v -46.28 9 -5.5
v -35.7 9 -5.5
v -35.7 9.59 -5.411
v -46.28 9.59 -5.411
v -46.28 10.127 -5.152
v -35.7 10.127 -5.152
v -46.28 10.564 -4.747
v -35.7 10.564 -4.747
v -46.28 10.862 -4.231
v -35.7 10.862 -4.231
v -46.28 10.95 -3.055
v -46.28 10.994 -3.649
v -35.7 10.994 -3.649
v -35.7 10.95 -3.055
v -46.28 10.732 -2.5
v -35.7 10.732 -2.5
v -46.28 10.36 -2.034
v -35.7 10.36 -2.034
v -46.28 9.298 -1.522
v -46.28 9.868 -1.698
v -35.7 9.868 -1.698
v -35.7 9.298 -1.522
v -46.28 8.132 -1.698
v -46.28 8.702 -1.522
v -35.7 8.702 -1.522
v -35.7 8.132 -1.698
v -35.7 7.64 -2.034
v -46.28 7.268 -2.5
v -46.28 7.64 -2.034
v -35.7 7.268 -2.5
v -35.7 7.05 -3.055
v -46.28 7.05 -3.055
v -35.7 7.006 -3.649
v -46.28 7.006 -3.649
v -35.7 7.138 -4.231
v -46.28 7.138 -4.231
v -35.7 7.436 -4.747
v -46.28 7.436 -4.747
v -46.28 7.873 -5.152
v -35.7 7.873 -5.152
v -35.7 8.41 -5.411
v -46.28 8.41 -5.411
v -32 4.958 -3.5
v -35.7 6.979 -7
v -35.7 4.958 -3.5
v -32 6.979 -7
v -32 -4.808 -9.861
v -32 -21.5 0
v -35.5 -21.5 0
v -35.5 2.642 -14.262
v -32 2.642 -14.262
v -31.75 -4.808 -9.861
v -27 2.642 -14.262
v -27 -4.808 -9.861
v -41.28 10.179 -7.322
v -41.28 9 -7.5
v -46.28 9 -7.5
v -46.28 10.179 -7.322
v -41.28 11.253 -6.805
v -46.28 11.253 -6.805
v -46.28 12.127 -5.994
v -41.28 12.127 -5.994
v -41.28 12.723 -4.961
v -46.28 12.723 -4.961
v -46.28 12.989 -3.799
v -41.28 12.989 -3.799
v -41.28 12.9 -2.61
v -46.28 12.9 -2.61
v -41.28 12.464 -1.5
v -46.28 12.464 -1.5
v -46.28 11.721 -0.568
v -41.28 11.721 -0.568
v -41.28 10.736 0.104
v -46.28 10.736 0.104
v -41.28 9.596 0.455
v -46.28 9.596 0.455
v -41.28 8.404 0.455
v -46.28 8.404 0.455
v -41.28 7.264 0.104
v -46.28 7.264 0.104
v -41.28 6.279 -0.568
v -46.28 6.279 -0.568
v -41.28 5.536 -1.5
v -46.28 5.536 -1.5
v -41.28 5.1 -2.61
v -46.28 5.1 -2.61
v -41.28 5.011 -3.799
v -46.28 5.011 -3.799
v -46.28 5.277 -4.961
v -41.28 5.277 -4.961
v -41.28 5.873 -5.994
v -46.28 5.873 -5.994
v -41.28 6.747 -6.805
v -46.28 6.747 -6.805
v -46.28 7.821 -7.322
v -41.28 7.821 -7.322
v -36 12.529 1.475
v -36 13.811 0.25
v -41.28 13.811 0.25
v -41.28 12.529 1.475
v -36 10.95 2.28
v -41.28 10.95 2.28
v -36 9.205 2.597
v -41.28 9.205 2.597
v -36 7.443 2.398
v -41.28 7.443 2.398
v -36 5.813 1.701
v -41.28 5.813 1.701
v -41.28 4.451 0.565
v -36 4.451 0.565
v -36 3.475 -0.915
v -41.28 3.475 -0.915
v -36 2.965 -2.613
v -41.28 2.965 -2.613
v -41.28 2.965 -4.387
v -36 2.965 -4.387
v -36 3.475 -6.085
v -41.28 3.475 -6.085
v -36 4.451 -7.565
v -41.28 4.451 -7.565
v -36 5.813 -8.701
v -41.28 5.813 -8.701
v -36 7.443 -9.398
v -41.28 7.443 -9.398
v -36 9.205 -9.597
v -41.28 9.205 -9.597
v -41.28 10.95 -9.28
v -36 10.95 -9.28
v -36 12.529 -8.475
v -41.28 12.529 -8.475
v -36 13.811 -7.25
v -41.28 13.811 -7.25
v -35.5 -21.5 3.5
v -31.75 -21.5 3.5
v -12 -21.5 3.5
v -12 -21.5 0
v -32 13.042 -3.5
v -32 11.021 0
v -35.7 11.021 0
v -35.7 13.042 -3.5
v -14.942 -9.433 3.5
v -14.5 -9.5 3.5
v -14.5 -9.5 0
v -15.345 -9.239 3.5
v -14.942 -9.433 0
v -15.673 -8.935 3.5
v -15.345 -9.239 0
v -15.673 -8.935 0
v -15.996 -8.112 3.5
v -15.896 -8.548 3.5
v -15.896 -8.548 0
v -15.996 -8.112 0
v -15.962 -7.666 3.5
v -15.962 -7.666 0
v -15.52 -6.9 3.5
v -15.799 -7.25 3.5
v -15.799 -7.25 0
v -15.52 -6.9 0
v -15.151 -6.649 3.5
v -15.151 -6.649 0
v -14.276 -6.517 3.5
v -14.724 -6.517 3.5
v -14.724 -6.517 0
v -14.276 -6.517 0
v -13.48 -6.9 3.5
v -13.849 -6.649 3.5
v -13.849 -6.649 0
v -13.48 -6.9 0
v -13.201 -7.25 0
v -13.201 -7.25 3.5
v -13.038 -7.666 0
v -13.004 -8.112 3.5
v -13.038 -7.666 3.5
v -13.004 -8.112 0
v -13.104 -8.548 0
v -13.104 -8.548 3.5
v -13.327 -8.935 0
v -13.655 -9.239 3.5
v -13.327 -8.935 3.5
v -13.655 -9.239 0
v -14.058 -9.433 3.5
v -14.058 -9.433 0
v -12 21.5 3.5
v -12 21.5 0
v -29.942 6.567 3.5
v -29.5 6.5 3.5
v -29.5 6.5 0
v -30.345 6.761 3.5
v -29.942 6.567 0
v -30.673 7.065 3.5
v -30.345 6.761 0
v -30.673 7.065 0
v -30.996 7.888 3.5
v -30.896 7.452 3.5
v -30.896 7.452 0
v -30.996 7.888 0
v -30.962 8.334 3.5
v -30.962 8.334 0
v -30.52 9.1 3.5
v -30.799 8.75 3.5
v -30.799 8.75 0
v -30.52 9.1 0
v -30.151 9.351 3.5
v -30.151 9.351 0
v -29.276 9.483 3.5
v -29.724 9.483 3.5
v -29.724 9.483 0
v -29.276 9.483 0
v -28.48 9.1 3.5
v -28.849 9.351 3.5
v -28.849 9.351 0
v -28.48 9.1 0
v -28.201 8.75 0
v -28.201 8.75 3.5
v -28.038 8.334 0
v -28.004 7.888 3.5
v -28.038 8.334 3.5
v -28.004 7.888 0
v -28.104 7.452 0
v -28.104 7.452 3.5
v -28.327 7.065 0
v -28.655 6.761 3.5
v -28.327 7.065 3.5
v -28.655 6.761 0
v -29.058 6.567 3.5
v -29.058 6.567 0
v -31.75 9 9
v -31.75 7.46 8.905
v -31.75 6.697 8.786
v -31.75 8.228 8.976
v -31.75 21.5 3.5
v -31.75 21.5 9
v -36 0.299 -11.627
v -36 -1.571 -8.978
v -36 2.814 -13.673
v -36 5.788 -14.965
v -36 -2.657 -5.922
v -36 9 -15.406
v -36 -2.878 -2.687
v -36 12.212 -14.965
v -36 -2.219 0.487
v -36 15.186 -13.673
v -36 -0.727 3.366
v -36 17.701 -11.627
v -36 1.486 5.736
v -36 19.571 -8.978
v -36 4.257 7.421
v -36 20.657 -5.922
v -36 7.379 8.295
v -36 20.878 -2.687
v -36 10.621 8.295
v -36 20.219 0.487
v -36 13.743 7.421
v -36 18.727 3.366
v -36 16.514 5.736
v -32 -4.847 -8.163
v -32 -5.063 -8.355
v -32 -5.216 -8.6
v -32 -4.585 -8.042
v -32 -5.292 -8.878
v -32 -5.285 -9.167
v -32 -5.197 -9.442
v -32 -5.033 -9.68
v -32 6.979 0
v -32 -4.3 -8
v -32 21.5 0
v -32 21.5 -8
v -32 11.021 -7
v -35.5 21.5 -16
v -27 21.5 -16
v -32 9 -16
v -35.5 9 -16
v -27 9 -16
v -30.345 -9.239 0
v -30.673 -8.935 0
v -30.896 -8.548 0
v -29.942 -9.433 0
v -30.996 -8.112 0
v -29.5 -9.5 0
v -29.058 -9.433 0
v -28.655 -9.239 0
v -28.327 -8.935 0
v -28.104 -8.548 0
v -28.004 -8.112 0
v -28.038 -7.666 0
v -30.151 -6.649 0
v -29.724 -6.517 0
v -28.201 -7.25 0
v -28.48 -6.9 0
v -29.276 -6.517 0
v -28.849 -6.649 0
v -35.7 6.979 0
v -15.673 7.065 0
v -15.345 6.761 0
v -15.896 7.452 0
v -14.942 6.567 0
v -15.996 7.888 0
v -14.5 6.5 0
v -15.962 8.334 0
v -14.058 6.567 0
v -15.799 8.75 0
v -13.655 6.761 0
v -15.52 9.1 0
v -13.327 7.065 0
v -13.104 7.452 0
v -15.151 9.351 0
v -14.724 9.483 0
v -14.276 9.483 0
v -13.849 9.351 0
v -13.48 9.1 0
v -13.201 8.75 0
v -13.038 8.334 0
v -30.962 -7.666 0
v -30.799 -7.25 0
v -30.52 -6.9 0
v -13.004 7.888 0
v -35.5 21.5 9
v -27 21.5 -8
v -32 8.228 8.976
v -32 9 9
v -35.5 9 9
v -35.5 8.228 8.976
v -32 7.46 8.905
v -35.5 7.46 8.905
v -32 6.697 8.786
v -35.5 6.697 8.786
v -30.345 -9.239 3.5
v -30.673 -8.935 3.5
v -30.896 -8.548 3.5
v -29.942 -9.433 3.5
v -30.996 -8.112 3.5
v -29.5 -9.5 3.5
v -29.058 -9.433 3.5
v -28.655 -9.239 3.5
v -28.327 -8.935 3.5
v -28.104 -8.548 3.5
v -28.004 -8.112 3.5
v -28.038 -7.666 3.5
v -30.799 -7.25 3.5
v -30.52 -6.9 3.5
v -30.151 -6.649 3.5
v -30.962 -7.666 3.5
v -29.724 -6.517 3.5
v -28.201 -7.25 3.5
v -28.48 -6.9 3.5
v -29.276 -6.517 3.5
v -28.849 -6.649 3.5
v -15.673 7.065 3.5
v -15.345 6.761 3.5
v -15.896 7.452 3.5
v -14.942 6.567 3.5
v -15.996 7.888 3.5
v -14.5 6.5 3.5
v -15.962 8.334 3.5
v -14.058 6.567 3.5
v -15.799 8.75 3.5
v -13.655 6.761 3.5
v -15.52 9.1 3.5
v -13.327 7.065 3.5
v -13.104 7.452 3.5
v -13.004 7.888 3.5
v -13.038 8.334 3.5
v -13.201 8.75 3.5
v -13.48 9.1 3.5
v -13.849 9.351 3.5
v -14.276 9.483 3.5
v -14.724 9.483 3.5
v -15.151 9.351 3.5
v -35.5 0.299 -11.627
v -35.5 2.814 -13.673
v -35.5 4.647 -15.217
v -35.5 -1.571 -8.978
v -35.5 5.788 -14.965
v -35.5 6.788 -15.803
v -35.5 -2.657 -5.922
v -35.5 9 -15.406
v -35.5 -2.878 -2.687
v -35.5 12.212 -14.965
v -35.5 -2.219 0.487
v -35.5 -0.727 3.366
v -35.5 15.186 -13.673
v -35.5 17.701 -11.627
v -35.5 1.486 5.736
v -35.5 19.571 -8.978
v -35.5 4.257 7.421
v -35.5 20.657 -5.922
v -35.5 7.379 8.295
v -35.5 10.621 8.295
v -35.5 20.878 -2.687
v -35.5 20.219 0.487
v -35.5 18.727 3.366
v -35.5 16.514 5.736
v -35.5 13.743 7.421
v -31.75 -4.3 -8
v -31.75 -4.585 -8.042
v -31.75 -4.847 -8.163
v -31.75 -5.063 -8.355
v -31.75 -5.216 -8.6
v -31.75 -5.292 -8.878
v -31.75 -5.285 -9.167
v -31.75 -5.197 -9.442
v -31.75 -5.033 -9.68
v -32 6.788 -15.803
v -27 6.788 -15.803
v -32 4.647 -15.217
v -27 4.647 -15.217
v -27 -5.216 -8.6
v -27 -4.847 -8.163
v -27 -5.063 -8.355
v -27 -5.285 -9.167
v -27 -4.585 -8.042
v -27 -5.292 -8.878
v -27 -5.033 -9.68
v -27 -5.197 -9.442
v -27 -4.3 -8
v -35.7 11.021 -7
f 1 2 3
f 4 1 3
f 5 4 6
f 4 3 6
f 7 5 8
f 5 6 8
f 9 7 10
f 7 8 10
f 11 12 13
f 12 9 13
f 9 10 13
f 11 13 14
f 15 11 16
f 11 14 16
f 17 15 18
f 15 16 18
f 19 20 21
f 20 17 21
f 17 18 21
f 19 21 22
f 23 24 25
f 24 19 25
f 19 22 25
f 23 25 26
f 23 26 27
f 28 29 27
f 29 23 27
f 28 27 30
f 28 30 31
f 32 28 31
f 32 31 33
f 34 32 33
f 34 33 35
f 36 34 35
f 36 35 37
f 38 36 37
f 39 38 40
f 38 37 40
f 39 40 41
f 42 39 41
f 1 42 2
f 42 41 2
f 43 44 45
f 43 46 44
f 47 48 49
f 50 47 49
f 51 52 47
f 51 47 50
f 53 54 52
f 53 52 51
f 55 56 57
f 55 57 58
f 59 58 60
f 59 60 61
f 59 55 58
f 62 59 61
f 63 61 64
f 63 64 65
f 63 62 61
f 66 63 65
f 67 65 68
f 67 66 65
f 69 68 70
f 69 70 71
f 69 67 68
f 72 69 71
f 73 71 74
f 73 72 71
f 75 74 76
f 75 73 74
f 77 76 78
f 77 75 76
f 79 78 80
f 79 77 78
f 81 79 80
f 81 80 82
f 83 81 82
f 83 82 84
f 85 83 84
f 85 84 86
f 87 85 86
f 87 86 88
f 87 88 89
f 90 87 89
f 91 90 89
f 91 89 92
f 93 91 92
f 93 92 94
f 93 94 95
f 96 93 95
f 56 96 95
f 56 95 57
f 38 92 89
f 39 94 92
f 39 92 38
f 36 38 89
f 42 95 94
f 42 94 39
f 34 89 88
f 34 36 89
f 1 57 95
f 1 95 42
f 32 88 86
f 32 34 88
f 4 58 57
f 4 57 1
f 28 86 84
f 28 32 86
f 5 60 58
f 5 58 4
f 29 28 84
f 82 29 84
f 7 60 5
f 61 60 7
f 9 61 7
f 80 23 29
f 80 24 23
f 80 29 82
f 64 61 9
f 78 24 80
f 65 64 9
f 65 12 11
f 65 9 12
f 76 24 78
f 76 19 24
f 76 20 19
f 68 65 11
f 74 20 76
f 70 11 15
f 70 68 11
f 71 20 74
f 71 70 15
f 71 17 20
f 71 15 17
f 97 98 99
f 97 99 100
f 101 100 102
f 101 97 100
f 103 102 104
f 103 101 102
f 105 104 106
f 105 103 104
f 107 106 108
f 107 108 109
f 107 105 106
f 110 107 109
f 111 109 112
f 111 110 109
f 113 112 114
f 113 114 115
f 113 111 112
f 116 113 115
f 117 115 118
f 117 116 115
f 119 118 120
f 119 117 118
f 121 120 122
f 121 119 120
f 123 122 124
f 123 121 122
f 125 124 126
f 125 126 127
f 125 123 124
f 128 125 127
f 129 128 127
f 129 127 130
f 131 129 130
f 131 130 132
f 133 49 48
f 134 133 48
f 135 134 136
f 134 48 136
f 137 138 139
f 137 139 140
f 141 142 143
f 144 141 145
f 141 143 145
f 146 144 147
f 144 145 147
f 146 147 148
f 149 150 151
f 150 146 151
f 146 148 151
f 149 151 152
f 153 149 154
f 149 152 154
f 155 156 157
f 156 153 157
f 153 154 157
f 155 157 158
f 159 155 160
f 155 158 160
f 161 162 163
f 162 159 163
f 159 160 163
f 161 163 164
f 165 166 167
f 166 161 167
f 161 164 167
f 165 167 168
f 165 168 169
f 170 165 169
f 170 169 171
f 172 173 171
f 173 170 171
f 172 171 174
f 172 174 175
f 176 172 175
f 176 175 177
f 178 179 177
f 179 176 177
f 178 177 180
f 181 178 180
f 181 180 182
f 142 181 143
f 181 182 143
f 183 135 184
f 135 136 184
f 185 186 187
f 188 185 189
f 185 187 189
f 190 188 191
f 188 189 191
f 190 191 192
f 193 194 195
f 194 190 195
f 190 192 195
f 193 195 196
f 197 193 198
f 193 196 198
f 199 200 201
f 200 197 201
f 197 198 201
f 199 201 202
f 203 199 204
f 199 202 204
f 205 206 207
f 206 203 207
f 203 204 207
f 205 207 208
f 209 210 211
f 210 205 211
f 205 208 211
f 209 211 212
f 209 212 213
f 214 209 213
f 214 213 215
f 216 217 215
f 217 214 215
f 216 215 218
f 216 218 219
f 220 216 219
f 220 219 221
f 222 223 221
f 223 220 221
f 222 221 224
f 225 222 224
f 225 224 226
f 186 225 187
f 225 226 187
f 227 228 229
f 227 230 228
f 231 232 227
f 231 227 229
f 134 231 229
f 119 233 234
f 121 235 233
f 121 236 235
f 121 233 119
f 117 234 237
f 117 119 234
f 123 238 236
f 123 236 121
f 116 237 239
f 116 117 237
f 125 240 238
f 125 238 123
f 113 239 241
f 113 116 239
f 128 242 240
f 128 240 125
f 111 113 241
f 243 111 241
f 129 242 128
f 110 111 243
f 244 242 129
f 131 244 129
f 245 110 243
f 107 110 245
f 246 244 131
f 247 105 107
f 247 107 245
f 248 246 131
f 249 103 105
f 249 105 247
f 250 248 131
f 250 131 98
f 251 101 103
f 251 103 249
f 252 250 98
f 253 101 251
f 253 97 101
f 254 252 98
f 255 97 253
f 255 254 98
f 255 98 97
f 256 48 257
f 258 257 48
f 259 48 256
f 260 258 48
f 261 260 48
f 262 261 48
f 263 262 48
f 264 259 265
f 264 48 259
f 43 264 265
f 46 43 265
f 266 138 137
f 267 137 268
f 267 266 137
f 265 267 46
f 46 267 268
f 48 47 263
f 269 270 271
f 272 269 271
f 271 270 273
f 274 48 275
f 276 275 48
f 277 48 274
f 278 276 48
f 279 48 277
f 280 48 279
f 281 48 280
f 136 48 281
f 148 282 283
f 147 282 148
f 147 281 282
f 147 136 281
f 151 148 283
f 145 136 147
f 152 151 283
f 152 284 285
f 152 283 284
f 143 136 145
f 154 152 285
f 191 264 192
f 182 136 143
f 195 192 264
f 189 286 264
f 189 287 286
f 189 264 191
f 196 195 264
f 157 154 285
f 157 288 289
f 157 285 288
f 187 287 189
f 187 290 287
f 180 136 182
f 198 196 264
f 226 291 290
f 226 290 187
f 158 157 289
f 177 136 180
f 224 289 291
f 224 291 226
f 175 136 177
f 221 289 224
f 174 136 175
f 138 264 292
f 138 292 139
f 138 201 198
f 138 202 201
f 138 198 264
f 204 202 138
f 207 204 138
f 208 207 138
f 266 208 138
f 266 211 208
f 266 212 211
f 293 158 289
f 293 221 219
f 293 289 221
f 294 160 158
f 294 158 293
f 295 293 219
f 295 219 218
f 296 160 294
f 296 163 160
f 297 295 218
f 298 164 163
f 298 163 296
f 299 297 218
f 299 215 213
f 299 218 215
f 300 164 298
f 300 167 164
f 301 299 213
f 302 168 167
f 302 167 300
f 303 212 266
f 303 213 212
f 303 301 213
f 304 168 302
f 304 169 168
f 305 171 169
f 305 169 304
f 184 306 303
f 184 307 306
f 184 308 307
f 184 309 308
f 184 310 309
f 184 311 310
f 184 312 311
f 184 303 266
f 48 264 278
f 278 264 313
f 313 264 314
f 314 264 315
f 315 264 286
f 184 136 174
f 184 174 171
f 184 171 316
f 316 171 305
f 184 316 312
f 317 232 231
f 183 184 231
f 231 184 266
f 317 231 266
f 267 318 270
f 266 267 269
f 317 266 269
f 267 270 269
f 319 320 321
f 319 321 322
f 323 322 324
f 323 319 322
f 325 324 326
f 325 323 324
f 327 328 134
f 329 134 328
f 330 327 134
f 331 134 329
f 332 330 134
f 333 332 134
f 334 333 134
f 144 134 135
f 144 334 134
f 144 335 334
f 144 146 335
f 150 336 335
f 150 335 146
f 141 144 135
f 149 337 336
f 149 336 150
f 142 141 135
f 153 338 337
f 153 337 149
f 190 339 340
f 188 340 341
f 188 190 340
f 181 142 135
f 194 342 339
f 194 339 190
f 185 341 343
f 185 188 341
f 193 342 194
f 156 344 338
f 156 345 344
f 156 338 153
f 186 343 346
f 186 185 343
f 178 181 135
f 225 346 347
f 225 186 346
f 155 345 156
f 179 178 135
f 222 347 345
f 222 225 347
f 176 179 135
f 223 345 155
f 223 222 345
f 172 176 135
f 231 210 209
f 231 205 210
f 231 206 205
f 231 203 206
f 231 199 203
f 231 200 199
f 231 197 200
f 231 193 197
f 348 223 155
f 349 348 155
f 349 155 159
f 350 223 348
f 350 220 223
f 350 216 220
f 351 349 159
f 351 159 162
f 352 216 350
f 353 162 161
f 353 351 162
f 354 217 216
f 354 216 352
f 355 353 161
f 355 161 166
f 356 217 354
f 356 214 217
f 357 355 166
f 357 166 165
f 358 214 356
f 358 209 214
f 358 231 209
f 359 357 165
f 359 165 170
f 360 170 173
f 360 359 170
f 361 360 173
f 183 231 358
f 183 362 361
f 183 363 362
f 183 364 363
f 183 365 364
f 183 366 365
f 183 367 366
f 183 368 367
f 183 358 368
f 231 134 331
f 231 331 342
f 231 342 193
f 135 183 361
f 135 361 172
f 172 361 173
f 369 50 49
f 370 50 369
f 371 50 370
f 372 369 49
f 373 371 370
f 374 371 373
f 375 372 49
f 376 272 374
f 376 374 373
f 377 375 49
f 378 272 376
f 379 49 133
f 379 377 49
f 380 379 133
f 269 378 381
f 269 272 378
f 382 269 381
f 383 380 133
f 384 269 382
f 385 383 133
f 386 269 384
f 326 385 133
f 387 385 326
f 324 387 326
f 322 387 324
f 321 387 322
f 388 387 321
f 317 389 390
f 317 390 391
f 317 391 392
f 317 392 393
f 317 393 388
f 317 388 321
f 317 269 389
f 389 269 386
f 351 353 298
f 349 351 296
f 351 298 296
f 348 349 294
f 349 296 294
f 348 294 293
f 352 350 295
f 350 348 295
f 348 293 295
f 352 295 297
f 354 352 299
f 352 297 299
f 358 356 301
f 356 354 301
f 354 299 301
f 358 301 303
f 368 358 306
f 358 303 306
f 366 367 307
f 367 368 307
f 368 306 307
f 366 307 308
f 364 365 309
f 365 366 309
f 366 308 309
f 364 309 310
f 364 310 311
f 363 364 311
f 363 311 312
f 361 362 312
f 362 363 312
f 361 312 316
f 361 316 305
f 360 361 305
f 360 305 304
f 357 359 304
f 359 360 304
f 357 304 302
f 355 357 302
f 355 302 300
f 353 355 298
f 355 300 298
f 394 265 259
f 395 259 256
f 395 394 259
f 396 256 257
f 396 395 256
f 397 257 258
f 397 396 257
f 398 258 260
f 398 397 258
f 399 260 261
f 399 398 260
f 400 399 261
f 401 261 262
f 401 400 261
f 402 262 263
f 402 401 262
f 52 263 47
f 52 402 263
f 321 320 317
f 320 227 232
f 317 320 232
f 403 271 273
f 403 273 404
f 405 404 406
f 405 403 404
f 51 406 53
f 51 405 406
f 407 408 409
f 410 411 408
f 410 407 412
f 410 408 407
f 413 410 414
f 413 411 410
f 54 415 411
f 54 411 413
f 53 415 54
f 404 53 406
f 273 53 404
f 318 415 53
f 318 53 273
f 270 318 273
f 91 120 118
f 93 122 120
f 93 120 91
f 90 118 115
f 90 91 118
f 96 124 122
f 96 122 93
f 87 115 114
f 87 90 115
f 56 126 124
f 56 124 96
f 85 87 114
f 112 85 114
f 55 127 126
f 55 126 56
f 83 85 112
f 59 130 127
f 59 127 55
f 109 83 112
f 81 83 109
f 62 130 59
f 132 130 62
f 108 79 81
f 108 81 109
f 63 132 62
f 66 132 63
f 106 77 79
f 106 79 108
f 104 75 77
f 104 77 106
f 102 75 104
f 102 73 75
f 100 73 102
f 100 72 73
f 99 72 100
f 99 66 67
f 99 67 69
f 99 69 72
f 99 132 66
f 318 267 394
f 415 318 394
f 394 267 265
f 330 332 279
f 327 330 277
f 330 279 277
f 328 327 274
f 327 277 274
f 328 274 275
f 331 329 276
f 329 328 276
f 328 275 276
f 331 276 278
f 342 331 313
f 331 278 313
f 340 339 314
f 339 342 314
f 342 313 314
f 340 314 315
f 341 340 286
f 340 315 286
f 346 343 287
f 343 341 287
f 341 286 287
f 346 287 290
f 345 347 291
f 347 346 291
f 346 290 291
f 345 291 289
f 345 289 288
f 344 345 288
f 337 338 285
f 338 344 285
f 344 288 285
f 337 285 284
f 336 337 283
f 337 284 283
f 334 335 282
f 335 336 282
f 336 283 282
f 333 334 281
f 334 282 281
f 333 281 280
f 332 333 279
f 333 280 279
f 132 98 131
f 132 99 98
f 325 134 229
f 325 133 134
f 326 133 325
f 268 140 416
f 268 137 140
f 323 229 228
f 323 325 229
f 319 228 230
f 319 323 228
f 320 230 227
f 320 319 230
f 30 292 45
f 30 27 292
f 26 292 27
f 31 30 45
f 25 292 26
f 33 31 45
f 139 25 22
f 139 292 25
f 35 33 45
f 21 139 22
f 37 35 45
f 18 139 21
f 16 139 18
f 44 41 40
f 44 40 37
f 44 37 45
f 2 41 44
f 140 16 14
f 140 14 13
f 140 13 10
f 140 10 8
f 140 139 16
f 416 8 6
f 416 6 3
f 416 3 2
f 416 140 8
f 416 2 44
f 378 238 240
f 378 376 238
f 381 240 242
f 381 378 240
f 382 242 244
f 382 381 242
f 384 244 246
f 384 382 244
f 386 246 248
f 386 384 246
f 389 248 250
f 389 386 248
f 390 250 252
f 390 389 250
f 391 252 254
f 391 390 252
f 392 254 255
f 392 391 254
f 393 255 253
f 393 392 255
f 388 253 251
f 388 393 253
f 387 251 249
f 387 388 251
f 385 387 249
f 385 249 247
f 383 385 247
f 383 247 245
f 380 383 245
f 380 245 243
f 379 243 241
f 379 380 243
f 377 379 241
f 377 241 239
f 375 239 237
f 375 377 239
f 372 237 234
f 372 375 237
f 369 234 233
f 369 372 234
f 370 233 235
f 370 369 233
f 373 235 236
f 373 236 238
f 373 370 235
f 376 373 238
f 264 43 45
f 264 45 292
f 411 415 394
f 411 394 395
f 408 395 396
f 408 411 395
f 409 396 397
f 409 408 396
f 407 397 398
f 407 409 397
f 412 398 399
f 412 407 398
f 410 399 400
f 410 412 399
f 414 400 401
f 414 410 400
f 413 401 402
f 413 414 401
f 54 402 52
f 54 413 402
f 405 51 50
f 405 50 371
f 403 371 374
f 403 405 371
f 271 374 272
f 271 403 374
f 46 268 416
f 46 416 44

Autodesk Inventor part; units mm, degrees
ref_plane "YZ Plane" through (0, 0, 0) normal (1, 0, 0) x (0, 1, 0)
ref_plane "XZ Plane" through (0, 0, 0) normal (0, 1, 0) x (-1, 0, 0)
sketch "Sketch1" plane through (0, 0, 0) normal (0, 0, 1) x (1, 0, 0)
  line L0 (-10, -21.5) -> (10, -21.5)
  line L1 (10, -21.5) -> (10, 21.5)
  line L2 (10, 21.5) -> (-10, 21.5)
  line L3 (-10, 21.5) -> (-10, -21.5)
  line L4 (-10, -21.5) -> (10, 21.5) construction
  line L5 (10, -21.5) -> (-10, 21.5) construction
  point P0 (0, 0)
  dimension "d0" = 20
  dimension "d1" = 43
extrude "Extrusion1" add sketch "Sketch1" along normal blind 3.5
sketch "Sketch2" plane through (0, 0, 3.5) normal (0, 0, 1) x (1, 0, 0)
  line L0 (-7.5, -8) -> (7.5, -8)
  line L1 (7.5, -8) -> (7.5, 8)
  line L2 (7.5, 8) -> (-7.5, 8)
  line L3 (-7.5, 8) -> (-7.5, -8)
  line L4 (-7.5, -8) -> (7.5, 8) construction
  line L5 (7.5, -8) -> (-7.5, 8) construction
  point P0 (0, 0)
  dimension "d4" = 15
  dimension "d5" = 16
hole "Hole1" at (-7.5, 8, 3.5) at (7.5, 8, 3.5) at (7.5, -8, 3.5) at (-7.5, -8, 3.5) direction (0, 0, -1) diameter 3 end through all
sketch "Sketch3" plane through (10, -21.5, 0) normal (1, 0, 0) x (0, 0, -1)
  circle A0 centre (3.5, 30.5) radius 11.9062
  line L0 (0, 0) -> (0, 43) projected
  circle A1 centre (3.5, 30.5) radius 12.5
  line L1 (0, 43) -> (3.5, 43)
  line L2 (14.2623, 24.142) -> (0, 0)
  line L3 (-3.5, 43) -> (-3.5, 0) projected
  line L4 (-3.5, 43) -> (-7.1577, 37.0317)
  line L5 (-3.5, 0) -> (-8.786, 28.1968)
  line L6 (0, 0) -> (-3.5, 0) projected
  line L7 (0, 43) -> (-3.5, 43) projected
  line L8 (16, 30.5) -> (16, 43)
  line L9 (16, 43) -> (-9, 43)
  line L10 (-9, 43) -> (-9, 30.5)
  line L11 (9, 43) -> (12.7158, 38.945)
  point P0 (0, 21.5)
  point P1 (0, 21.5)
  point P2 (3.5, 43)
  dimension "d14" = 25
  dimension "d13" = 23.8125
  dimension "d15" = 3.5
  dimension "d26" = 9
extrude "Extrusion2" add sketch "Sketch3" along normal blind 3.5
sketch "Sketch4" plane through (13.5, -21.5, 0) normal (1, 0, 0) x (0, 0, -1)
  circle A0 centre (3.5, 30.5) radius 11.9062 projected
  point P0 (0, 21.5)
extrude "Extrusion3" add sketch "Sketch4" along normal blind 0.5
sketch "Sketch5" plane through (10, -21.5, 0) normal (-1, 0, 0) x (0, 0, 1)
  line L0 (3.5, 0) -> (3.5, 43) projected
  line L1 (8.786, 28.1968) -> (3.5, 0) projected
  arc A0 (-16, 30.5) -> (-14.2623, 24.142) centre (-3.5, 30.5) ccw projected
  arc A1 (8.786, 28.1968) -> (9, 30.5) centre (-3.5, 30.5) ccw projected
  line L2 (0, 0) -> (0, 43) projected
  line L3 (0, 0) -> (-14.2623, 24.142) projected
  line L4 (-16, 43) -> (0, 43) projected
  line L5 (-16, 30.5) -> (-16, 43) projected
  line L6 (9, 43) -> (9, 30.5) projected
  line L7 (3.5, 43) -> (9, 43) projected
  point P0 (0, 21.5)
extrude "Extrusion4" add sketch "Sketch5" along normal blind 0.25
sketch "Sketch6" plane through (10, -21.5, 0) normal (-1, 0, 0) x (0, 0, 1)
  line L0 (-14.2623, 24.142) -> (0, 0) projected
  line L1 (0, 43) -> (0, 0) projected
  line L2 (0, 43) -> (-16, 43) projected
  line L3 (-16, 43) -> (-16, 30.5) projected
  arc A0 (-16, 30.5) -> (-14.2623, 24.142) centre (-3.5, 30.5) ccw projected
  line L4 (-8, 13.5418) -> (-8, 43)
  dimension "d67" = 8
extrude "Extrusion5" add sketch "Sketch6" along normal blind 5 contours A0 L3 L2 L4 L0
sketch "Sketch7" plane through (14, 9, -3.5) normal (1, 0, 0) x (0, 0, -1)
  circle A0 centre (0, 0) radius 11.9062 projected
  circle A1 centre (0, 0) radius 6.1
  circle A2 centre (-2, 3.4641) radius 1.5
  circle A3 centre (4, 0) radius 1.5
  circle A4 centre (-2, -3.4641) radius 1.5
  line L0 (-2, 3.4641) -> (0, 0) construction
  line L1 (0, 0) -> (4, 0) construction
  line L2 (-2, -3.4641) -> (0, 0) construction
  circle A5 centre (0, 0) radius 2
  point P0 (-3.5, -9)
  dimension "d27" = 12.2
  dimension "d28" = 3
  dimension "d29" = 120
  dimension "d30" = 120
  dimension "d31" = 4
  dimension "d32" = 4
sketch "Sketch10" plane through (14, 9, -3.5) normal (1, 0, 0) x (0, 0, -1)
  circle A0 centre (0, 0) radius 11.9062 projected
  circle A1 centre (0, 0) radius 6.1
  point P0 (-3.5, -9)
  dimension "d44" = 12.2
extrude "Extrusion7" add sketch "Sketch10" along normal blind 5.28 contours A1
sketch "Sketch11" plane through (19.28, 9, -3.5) normal (1, 0, 0) x (0, 0, -1)
  circle A0 centre (0, 0) radius 6.1 projected
  circle A1 centre (0, 0) radius 4
  point P0 (-3.5, -9)
  dimension "d47" = 8
extrude "Extrusion8" add sketch "Sketch11" along normal blind 5 contours A1
sketch "Sketch12" plane through (24.28, 9, -3.5) normal (1, 0, 0) x (0, 0, -1)
  circle A0 centre (0, 0) radius 4 projected
  point P0 (-3.5, -9)
hole "Hole3" at (24.28, 9, -3.5) direction (-1, 0, 0) diameter 4 end through all
sketch "Sketch13" plane through (10, -21.5, 0) normal (-1, 0, 0) x (0, 0, 1)
  circle A0 centre (-3.5, 30.5) radius 2 projected
  line L0 (-8, 43) -> (-8, 13.5418) projected
  line L1 (-8, 13.5418) -> (0, 0) projected
  line L2 (0, 43) -> (0, 0) projected
  line L3 (0, 43) -> (-8, 43) projected
  line L4 (-7, 32.5207) -> (-3.5, 34.5415)
  line L5 (-3.5, 34.5415) -> (0, 32.5207)
  line L6 (0, 32.5207) -> (0, 28.4793)
  line L7 (0, 28.4793) -> (-3.5, 26.4585)
  line L8 (-3.5, 26.4585) -> (-7, 28.4793)
  line L9 (-7, 28.4793) -> (-7, 32.5207)
  point P0 (-7, 30.5)
  point P1 (0, 28.4793)
  point P2 (0, 32.5207)
  dimension "d68" = 7
extrude "Extrusion9" cut sketch "Sketch13" against normal blind 3.7 contours L2 L7 L8 L9 L4 L5
sketch "Sketch15" plane through (19.28, 9, -3.5) normal (1, 0, 0) x (0, 0, -1)
  circle A0 centre (0, 0) radius 4 projected
  circle A1 centre (0, 0) radius 6.1 projected
  line L0 (3.75, 4.8112) -> (-3.75, 4.8112)
  point P0 (-3.5, -9)
  dimension "d62" = 7.5
extrude "Extrusion11" cut sketch "Sketch15" against normal up to surface (5.28 mm away) contours L0 A1 picked at (-0.8686, 5.0459)
sketch "Sketch17" plane through (9.75, -21.5, 0) normal (-1, 0, 0) x (0, 0, 1)
  line L0 (-7, 28.4793) -> (-7, 32.5207) projected
  line L1 (-3.5, 26.4585) -> (-7, 28.4793) projected
  line L2 (0, 28.4793) -> (-3.5, 26.4585) projected
  line L3 (0, 32.5207) -> (0, 28.4793) projected
  line L4 (-3.5, 34.5415) -> (0, 32.5207) projected
  line L5 (-7, 32.5207) -> (-3.5, 34.5415) projected
  circle A0 centre (-3.5, 30.5) radius 2 projected
  point P0 (0, 21.5)
extrude "Extrusion13" cut sketch "Sketch17" against normal blind 3.7 contours L0 L5 L4 L3 L2 L1 | A0
fillet "Fillet2" radius 1 1 edges at (7.375, -7.9582, -8)
sketch "Sketch18" plane through (9.75, -21.5, 0) normal (-1, 0, 0) x (0, 0, 1)
  line L0 (0, 28.4793) -> (-3.5, 26.4585) projected
  line L1 (-3.5, 26.4585) -> (-7, 28.4793) projected
  line L2 (-7, 28.4793) -> (-7, 32.5207) projected
  line L3 (-7, 32.5207) -> (-3.5, 34.5415) projected
  line L4 (-3.5, 34.5415) -> (0, 32.5207) projected
  line L5 (0, 43) -> (0, 32.5207) projected
  line L6 (0, 43) -> (-8, 43) projected
  line L7 (-8, 43) -> (-8, 17.2005) projected
  arc A0 (-9.861, 16.6919) -> (-8, 17.2005) centre (-9, 17.2005) ccw projected
  line L8 (-9.861, 16.6919) -> (0, 0) projected
  line L9 (0, 28.4793) -> (0, 0) projected
  point P0 (0, 21.5)
extrude "Extrusion14" cut sketch "Sketch18" against normal blind 0.25
ref_plane "Work Plane1" through (-11, -21.5, 0) normal (-1, 0, 0) x (0, 0, 1)
mirror "Mirror1" about plane through (-11, -21.5, 0) normal (-1, 0, 0) of "Extrusion1", "Hole1", "Extrusion2", "Extrusion3", "Extrusion4", "Extrusion5", "Extrusion7", "Extrusion8", "Hole3", "Extrusion9", "Extrusion11", "Extrusion13", "Fillet2", "Extrusion14"
sketch "Sketch19" plane through (-11, -21.5, 0) normal (-1, 0, 0) x (0, 0, 1)
  line L0 (-26.4701, -15.0074) -> (17.4098, -15.0074)
  line L1 (17.4098, -15.0074) -> (17.4098, 56.4974)
  line L2 (17.4098, 56.4974) -> (-26.4701, 56.4974)
  line L3 (-26.4701, 56.4974) -> (-26.4701, -15.0074)
  point P0 (0, 21.5)
extrude "Extrusion15" cut sketch "Sketch19" against normal through all
equation "\"d30\" = d29"
properties part number "CarriagePivotMountMirror" material "ABS Plastic"
